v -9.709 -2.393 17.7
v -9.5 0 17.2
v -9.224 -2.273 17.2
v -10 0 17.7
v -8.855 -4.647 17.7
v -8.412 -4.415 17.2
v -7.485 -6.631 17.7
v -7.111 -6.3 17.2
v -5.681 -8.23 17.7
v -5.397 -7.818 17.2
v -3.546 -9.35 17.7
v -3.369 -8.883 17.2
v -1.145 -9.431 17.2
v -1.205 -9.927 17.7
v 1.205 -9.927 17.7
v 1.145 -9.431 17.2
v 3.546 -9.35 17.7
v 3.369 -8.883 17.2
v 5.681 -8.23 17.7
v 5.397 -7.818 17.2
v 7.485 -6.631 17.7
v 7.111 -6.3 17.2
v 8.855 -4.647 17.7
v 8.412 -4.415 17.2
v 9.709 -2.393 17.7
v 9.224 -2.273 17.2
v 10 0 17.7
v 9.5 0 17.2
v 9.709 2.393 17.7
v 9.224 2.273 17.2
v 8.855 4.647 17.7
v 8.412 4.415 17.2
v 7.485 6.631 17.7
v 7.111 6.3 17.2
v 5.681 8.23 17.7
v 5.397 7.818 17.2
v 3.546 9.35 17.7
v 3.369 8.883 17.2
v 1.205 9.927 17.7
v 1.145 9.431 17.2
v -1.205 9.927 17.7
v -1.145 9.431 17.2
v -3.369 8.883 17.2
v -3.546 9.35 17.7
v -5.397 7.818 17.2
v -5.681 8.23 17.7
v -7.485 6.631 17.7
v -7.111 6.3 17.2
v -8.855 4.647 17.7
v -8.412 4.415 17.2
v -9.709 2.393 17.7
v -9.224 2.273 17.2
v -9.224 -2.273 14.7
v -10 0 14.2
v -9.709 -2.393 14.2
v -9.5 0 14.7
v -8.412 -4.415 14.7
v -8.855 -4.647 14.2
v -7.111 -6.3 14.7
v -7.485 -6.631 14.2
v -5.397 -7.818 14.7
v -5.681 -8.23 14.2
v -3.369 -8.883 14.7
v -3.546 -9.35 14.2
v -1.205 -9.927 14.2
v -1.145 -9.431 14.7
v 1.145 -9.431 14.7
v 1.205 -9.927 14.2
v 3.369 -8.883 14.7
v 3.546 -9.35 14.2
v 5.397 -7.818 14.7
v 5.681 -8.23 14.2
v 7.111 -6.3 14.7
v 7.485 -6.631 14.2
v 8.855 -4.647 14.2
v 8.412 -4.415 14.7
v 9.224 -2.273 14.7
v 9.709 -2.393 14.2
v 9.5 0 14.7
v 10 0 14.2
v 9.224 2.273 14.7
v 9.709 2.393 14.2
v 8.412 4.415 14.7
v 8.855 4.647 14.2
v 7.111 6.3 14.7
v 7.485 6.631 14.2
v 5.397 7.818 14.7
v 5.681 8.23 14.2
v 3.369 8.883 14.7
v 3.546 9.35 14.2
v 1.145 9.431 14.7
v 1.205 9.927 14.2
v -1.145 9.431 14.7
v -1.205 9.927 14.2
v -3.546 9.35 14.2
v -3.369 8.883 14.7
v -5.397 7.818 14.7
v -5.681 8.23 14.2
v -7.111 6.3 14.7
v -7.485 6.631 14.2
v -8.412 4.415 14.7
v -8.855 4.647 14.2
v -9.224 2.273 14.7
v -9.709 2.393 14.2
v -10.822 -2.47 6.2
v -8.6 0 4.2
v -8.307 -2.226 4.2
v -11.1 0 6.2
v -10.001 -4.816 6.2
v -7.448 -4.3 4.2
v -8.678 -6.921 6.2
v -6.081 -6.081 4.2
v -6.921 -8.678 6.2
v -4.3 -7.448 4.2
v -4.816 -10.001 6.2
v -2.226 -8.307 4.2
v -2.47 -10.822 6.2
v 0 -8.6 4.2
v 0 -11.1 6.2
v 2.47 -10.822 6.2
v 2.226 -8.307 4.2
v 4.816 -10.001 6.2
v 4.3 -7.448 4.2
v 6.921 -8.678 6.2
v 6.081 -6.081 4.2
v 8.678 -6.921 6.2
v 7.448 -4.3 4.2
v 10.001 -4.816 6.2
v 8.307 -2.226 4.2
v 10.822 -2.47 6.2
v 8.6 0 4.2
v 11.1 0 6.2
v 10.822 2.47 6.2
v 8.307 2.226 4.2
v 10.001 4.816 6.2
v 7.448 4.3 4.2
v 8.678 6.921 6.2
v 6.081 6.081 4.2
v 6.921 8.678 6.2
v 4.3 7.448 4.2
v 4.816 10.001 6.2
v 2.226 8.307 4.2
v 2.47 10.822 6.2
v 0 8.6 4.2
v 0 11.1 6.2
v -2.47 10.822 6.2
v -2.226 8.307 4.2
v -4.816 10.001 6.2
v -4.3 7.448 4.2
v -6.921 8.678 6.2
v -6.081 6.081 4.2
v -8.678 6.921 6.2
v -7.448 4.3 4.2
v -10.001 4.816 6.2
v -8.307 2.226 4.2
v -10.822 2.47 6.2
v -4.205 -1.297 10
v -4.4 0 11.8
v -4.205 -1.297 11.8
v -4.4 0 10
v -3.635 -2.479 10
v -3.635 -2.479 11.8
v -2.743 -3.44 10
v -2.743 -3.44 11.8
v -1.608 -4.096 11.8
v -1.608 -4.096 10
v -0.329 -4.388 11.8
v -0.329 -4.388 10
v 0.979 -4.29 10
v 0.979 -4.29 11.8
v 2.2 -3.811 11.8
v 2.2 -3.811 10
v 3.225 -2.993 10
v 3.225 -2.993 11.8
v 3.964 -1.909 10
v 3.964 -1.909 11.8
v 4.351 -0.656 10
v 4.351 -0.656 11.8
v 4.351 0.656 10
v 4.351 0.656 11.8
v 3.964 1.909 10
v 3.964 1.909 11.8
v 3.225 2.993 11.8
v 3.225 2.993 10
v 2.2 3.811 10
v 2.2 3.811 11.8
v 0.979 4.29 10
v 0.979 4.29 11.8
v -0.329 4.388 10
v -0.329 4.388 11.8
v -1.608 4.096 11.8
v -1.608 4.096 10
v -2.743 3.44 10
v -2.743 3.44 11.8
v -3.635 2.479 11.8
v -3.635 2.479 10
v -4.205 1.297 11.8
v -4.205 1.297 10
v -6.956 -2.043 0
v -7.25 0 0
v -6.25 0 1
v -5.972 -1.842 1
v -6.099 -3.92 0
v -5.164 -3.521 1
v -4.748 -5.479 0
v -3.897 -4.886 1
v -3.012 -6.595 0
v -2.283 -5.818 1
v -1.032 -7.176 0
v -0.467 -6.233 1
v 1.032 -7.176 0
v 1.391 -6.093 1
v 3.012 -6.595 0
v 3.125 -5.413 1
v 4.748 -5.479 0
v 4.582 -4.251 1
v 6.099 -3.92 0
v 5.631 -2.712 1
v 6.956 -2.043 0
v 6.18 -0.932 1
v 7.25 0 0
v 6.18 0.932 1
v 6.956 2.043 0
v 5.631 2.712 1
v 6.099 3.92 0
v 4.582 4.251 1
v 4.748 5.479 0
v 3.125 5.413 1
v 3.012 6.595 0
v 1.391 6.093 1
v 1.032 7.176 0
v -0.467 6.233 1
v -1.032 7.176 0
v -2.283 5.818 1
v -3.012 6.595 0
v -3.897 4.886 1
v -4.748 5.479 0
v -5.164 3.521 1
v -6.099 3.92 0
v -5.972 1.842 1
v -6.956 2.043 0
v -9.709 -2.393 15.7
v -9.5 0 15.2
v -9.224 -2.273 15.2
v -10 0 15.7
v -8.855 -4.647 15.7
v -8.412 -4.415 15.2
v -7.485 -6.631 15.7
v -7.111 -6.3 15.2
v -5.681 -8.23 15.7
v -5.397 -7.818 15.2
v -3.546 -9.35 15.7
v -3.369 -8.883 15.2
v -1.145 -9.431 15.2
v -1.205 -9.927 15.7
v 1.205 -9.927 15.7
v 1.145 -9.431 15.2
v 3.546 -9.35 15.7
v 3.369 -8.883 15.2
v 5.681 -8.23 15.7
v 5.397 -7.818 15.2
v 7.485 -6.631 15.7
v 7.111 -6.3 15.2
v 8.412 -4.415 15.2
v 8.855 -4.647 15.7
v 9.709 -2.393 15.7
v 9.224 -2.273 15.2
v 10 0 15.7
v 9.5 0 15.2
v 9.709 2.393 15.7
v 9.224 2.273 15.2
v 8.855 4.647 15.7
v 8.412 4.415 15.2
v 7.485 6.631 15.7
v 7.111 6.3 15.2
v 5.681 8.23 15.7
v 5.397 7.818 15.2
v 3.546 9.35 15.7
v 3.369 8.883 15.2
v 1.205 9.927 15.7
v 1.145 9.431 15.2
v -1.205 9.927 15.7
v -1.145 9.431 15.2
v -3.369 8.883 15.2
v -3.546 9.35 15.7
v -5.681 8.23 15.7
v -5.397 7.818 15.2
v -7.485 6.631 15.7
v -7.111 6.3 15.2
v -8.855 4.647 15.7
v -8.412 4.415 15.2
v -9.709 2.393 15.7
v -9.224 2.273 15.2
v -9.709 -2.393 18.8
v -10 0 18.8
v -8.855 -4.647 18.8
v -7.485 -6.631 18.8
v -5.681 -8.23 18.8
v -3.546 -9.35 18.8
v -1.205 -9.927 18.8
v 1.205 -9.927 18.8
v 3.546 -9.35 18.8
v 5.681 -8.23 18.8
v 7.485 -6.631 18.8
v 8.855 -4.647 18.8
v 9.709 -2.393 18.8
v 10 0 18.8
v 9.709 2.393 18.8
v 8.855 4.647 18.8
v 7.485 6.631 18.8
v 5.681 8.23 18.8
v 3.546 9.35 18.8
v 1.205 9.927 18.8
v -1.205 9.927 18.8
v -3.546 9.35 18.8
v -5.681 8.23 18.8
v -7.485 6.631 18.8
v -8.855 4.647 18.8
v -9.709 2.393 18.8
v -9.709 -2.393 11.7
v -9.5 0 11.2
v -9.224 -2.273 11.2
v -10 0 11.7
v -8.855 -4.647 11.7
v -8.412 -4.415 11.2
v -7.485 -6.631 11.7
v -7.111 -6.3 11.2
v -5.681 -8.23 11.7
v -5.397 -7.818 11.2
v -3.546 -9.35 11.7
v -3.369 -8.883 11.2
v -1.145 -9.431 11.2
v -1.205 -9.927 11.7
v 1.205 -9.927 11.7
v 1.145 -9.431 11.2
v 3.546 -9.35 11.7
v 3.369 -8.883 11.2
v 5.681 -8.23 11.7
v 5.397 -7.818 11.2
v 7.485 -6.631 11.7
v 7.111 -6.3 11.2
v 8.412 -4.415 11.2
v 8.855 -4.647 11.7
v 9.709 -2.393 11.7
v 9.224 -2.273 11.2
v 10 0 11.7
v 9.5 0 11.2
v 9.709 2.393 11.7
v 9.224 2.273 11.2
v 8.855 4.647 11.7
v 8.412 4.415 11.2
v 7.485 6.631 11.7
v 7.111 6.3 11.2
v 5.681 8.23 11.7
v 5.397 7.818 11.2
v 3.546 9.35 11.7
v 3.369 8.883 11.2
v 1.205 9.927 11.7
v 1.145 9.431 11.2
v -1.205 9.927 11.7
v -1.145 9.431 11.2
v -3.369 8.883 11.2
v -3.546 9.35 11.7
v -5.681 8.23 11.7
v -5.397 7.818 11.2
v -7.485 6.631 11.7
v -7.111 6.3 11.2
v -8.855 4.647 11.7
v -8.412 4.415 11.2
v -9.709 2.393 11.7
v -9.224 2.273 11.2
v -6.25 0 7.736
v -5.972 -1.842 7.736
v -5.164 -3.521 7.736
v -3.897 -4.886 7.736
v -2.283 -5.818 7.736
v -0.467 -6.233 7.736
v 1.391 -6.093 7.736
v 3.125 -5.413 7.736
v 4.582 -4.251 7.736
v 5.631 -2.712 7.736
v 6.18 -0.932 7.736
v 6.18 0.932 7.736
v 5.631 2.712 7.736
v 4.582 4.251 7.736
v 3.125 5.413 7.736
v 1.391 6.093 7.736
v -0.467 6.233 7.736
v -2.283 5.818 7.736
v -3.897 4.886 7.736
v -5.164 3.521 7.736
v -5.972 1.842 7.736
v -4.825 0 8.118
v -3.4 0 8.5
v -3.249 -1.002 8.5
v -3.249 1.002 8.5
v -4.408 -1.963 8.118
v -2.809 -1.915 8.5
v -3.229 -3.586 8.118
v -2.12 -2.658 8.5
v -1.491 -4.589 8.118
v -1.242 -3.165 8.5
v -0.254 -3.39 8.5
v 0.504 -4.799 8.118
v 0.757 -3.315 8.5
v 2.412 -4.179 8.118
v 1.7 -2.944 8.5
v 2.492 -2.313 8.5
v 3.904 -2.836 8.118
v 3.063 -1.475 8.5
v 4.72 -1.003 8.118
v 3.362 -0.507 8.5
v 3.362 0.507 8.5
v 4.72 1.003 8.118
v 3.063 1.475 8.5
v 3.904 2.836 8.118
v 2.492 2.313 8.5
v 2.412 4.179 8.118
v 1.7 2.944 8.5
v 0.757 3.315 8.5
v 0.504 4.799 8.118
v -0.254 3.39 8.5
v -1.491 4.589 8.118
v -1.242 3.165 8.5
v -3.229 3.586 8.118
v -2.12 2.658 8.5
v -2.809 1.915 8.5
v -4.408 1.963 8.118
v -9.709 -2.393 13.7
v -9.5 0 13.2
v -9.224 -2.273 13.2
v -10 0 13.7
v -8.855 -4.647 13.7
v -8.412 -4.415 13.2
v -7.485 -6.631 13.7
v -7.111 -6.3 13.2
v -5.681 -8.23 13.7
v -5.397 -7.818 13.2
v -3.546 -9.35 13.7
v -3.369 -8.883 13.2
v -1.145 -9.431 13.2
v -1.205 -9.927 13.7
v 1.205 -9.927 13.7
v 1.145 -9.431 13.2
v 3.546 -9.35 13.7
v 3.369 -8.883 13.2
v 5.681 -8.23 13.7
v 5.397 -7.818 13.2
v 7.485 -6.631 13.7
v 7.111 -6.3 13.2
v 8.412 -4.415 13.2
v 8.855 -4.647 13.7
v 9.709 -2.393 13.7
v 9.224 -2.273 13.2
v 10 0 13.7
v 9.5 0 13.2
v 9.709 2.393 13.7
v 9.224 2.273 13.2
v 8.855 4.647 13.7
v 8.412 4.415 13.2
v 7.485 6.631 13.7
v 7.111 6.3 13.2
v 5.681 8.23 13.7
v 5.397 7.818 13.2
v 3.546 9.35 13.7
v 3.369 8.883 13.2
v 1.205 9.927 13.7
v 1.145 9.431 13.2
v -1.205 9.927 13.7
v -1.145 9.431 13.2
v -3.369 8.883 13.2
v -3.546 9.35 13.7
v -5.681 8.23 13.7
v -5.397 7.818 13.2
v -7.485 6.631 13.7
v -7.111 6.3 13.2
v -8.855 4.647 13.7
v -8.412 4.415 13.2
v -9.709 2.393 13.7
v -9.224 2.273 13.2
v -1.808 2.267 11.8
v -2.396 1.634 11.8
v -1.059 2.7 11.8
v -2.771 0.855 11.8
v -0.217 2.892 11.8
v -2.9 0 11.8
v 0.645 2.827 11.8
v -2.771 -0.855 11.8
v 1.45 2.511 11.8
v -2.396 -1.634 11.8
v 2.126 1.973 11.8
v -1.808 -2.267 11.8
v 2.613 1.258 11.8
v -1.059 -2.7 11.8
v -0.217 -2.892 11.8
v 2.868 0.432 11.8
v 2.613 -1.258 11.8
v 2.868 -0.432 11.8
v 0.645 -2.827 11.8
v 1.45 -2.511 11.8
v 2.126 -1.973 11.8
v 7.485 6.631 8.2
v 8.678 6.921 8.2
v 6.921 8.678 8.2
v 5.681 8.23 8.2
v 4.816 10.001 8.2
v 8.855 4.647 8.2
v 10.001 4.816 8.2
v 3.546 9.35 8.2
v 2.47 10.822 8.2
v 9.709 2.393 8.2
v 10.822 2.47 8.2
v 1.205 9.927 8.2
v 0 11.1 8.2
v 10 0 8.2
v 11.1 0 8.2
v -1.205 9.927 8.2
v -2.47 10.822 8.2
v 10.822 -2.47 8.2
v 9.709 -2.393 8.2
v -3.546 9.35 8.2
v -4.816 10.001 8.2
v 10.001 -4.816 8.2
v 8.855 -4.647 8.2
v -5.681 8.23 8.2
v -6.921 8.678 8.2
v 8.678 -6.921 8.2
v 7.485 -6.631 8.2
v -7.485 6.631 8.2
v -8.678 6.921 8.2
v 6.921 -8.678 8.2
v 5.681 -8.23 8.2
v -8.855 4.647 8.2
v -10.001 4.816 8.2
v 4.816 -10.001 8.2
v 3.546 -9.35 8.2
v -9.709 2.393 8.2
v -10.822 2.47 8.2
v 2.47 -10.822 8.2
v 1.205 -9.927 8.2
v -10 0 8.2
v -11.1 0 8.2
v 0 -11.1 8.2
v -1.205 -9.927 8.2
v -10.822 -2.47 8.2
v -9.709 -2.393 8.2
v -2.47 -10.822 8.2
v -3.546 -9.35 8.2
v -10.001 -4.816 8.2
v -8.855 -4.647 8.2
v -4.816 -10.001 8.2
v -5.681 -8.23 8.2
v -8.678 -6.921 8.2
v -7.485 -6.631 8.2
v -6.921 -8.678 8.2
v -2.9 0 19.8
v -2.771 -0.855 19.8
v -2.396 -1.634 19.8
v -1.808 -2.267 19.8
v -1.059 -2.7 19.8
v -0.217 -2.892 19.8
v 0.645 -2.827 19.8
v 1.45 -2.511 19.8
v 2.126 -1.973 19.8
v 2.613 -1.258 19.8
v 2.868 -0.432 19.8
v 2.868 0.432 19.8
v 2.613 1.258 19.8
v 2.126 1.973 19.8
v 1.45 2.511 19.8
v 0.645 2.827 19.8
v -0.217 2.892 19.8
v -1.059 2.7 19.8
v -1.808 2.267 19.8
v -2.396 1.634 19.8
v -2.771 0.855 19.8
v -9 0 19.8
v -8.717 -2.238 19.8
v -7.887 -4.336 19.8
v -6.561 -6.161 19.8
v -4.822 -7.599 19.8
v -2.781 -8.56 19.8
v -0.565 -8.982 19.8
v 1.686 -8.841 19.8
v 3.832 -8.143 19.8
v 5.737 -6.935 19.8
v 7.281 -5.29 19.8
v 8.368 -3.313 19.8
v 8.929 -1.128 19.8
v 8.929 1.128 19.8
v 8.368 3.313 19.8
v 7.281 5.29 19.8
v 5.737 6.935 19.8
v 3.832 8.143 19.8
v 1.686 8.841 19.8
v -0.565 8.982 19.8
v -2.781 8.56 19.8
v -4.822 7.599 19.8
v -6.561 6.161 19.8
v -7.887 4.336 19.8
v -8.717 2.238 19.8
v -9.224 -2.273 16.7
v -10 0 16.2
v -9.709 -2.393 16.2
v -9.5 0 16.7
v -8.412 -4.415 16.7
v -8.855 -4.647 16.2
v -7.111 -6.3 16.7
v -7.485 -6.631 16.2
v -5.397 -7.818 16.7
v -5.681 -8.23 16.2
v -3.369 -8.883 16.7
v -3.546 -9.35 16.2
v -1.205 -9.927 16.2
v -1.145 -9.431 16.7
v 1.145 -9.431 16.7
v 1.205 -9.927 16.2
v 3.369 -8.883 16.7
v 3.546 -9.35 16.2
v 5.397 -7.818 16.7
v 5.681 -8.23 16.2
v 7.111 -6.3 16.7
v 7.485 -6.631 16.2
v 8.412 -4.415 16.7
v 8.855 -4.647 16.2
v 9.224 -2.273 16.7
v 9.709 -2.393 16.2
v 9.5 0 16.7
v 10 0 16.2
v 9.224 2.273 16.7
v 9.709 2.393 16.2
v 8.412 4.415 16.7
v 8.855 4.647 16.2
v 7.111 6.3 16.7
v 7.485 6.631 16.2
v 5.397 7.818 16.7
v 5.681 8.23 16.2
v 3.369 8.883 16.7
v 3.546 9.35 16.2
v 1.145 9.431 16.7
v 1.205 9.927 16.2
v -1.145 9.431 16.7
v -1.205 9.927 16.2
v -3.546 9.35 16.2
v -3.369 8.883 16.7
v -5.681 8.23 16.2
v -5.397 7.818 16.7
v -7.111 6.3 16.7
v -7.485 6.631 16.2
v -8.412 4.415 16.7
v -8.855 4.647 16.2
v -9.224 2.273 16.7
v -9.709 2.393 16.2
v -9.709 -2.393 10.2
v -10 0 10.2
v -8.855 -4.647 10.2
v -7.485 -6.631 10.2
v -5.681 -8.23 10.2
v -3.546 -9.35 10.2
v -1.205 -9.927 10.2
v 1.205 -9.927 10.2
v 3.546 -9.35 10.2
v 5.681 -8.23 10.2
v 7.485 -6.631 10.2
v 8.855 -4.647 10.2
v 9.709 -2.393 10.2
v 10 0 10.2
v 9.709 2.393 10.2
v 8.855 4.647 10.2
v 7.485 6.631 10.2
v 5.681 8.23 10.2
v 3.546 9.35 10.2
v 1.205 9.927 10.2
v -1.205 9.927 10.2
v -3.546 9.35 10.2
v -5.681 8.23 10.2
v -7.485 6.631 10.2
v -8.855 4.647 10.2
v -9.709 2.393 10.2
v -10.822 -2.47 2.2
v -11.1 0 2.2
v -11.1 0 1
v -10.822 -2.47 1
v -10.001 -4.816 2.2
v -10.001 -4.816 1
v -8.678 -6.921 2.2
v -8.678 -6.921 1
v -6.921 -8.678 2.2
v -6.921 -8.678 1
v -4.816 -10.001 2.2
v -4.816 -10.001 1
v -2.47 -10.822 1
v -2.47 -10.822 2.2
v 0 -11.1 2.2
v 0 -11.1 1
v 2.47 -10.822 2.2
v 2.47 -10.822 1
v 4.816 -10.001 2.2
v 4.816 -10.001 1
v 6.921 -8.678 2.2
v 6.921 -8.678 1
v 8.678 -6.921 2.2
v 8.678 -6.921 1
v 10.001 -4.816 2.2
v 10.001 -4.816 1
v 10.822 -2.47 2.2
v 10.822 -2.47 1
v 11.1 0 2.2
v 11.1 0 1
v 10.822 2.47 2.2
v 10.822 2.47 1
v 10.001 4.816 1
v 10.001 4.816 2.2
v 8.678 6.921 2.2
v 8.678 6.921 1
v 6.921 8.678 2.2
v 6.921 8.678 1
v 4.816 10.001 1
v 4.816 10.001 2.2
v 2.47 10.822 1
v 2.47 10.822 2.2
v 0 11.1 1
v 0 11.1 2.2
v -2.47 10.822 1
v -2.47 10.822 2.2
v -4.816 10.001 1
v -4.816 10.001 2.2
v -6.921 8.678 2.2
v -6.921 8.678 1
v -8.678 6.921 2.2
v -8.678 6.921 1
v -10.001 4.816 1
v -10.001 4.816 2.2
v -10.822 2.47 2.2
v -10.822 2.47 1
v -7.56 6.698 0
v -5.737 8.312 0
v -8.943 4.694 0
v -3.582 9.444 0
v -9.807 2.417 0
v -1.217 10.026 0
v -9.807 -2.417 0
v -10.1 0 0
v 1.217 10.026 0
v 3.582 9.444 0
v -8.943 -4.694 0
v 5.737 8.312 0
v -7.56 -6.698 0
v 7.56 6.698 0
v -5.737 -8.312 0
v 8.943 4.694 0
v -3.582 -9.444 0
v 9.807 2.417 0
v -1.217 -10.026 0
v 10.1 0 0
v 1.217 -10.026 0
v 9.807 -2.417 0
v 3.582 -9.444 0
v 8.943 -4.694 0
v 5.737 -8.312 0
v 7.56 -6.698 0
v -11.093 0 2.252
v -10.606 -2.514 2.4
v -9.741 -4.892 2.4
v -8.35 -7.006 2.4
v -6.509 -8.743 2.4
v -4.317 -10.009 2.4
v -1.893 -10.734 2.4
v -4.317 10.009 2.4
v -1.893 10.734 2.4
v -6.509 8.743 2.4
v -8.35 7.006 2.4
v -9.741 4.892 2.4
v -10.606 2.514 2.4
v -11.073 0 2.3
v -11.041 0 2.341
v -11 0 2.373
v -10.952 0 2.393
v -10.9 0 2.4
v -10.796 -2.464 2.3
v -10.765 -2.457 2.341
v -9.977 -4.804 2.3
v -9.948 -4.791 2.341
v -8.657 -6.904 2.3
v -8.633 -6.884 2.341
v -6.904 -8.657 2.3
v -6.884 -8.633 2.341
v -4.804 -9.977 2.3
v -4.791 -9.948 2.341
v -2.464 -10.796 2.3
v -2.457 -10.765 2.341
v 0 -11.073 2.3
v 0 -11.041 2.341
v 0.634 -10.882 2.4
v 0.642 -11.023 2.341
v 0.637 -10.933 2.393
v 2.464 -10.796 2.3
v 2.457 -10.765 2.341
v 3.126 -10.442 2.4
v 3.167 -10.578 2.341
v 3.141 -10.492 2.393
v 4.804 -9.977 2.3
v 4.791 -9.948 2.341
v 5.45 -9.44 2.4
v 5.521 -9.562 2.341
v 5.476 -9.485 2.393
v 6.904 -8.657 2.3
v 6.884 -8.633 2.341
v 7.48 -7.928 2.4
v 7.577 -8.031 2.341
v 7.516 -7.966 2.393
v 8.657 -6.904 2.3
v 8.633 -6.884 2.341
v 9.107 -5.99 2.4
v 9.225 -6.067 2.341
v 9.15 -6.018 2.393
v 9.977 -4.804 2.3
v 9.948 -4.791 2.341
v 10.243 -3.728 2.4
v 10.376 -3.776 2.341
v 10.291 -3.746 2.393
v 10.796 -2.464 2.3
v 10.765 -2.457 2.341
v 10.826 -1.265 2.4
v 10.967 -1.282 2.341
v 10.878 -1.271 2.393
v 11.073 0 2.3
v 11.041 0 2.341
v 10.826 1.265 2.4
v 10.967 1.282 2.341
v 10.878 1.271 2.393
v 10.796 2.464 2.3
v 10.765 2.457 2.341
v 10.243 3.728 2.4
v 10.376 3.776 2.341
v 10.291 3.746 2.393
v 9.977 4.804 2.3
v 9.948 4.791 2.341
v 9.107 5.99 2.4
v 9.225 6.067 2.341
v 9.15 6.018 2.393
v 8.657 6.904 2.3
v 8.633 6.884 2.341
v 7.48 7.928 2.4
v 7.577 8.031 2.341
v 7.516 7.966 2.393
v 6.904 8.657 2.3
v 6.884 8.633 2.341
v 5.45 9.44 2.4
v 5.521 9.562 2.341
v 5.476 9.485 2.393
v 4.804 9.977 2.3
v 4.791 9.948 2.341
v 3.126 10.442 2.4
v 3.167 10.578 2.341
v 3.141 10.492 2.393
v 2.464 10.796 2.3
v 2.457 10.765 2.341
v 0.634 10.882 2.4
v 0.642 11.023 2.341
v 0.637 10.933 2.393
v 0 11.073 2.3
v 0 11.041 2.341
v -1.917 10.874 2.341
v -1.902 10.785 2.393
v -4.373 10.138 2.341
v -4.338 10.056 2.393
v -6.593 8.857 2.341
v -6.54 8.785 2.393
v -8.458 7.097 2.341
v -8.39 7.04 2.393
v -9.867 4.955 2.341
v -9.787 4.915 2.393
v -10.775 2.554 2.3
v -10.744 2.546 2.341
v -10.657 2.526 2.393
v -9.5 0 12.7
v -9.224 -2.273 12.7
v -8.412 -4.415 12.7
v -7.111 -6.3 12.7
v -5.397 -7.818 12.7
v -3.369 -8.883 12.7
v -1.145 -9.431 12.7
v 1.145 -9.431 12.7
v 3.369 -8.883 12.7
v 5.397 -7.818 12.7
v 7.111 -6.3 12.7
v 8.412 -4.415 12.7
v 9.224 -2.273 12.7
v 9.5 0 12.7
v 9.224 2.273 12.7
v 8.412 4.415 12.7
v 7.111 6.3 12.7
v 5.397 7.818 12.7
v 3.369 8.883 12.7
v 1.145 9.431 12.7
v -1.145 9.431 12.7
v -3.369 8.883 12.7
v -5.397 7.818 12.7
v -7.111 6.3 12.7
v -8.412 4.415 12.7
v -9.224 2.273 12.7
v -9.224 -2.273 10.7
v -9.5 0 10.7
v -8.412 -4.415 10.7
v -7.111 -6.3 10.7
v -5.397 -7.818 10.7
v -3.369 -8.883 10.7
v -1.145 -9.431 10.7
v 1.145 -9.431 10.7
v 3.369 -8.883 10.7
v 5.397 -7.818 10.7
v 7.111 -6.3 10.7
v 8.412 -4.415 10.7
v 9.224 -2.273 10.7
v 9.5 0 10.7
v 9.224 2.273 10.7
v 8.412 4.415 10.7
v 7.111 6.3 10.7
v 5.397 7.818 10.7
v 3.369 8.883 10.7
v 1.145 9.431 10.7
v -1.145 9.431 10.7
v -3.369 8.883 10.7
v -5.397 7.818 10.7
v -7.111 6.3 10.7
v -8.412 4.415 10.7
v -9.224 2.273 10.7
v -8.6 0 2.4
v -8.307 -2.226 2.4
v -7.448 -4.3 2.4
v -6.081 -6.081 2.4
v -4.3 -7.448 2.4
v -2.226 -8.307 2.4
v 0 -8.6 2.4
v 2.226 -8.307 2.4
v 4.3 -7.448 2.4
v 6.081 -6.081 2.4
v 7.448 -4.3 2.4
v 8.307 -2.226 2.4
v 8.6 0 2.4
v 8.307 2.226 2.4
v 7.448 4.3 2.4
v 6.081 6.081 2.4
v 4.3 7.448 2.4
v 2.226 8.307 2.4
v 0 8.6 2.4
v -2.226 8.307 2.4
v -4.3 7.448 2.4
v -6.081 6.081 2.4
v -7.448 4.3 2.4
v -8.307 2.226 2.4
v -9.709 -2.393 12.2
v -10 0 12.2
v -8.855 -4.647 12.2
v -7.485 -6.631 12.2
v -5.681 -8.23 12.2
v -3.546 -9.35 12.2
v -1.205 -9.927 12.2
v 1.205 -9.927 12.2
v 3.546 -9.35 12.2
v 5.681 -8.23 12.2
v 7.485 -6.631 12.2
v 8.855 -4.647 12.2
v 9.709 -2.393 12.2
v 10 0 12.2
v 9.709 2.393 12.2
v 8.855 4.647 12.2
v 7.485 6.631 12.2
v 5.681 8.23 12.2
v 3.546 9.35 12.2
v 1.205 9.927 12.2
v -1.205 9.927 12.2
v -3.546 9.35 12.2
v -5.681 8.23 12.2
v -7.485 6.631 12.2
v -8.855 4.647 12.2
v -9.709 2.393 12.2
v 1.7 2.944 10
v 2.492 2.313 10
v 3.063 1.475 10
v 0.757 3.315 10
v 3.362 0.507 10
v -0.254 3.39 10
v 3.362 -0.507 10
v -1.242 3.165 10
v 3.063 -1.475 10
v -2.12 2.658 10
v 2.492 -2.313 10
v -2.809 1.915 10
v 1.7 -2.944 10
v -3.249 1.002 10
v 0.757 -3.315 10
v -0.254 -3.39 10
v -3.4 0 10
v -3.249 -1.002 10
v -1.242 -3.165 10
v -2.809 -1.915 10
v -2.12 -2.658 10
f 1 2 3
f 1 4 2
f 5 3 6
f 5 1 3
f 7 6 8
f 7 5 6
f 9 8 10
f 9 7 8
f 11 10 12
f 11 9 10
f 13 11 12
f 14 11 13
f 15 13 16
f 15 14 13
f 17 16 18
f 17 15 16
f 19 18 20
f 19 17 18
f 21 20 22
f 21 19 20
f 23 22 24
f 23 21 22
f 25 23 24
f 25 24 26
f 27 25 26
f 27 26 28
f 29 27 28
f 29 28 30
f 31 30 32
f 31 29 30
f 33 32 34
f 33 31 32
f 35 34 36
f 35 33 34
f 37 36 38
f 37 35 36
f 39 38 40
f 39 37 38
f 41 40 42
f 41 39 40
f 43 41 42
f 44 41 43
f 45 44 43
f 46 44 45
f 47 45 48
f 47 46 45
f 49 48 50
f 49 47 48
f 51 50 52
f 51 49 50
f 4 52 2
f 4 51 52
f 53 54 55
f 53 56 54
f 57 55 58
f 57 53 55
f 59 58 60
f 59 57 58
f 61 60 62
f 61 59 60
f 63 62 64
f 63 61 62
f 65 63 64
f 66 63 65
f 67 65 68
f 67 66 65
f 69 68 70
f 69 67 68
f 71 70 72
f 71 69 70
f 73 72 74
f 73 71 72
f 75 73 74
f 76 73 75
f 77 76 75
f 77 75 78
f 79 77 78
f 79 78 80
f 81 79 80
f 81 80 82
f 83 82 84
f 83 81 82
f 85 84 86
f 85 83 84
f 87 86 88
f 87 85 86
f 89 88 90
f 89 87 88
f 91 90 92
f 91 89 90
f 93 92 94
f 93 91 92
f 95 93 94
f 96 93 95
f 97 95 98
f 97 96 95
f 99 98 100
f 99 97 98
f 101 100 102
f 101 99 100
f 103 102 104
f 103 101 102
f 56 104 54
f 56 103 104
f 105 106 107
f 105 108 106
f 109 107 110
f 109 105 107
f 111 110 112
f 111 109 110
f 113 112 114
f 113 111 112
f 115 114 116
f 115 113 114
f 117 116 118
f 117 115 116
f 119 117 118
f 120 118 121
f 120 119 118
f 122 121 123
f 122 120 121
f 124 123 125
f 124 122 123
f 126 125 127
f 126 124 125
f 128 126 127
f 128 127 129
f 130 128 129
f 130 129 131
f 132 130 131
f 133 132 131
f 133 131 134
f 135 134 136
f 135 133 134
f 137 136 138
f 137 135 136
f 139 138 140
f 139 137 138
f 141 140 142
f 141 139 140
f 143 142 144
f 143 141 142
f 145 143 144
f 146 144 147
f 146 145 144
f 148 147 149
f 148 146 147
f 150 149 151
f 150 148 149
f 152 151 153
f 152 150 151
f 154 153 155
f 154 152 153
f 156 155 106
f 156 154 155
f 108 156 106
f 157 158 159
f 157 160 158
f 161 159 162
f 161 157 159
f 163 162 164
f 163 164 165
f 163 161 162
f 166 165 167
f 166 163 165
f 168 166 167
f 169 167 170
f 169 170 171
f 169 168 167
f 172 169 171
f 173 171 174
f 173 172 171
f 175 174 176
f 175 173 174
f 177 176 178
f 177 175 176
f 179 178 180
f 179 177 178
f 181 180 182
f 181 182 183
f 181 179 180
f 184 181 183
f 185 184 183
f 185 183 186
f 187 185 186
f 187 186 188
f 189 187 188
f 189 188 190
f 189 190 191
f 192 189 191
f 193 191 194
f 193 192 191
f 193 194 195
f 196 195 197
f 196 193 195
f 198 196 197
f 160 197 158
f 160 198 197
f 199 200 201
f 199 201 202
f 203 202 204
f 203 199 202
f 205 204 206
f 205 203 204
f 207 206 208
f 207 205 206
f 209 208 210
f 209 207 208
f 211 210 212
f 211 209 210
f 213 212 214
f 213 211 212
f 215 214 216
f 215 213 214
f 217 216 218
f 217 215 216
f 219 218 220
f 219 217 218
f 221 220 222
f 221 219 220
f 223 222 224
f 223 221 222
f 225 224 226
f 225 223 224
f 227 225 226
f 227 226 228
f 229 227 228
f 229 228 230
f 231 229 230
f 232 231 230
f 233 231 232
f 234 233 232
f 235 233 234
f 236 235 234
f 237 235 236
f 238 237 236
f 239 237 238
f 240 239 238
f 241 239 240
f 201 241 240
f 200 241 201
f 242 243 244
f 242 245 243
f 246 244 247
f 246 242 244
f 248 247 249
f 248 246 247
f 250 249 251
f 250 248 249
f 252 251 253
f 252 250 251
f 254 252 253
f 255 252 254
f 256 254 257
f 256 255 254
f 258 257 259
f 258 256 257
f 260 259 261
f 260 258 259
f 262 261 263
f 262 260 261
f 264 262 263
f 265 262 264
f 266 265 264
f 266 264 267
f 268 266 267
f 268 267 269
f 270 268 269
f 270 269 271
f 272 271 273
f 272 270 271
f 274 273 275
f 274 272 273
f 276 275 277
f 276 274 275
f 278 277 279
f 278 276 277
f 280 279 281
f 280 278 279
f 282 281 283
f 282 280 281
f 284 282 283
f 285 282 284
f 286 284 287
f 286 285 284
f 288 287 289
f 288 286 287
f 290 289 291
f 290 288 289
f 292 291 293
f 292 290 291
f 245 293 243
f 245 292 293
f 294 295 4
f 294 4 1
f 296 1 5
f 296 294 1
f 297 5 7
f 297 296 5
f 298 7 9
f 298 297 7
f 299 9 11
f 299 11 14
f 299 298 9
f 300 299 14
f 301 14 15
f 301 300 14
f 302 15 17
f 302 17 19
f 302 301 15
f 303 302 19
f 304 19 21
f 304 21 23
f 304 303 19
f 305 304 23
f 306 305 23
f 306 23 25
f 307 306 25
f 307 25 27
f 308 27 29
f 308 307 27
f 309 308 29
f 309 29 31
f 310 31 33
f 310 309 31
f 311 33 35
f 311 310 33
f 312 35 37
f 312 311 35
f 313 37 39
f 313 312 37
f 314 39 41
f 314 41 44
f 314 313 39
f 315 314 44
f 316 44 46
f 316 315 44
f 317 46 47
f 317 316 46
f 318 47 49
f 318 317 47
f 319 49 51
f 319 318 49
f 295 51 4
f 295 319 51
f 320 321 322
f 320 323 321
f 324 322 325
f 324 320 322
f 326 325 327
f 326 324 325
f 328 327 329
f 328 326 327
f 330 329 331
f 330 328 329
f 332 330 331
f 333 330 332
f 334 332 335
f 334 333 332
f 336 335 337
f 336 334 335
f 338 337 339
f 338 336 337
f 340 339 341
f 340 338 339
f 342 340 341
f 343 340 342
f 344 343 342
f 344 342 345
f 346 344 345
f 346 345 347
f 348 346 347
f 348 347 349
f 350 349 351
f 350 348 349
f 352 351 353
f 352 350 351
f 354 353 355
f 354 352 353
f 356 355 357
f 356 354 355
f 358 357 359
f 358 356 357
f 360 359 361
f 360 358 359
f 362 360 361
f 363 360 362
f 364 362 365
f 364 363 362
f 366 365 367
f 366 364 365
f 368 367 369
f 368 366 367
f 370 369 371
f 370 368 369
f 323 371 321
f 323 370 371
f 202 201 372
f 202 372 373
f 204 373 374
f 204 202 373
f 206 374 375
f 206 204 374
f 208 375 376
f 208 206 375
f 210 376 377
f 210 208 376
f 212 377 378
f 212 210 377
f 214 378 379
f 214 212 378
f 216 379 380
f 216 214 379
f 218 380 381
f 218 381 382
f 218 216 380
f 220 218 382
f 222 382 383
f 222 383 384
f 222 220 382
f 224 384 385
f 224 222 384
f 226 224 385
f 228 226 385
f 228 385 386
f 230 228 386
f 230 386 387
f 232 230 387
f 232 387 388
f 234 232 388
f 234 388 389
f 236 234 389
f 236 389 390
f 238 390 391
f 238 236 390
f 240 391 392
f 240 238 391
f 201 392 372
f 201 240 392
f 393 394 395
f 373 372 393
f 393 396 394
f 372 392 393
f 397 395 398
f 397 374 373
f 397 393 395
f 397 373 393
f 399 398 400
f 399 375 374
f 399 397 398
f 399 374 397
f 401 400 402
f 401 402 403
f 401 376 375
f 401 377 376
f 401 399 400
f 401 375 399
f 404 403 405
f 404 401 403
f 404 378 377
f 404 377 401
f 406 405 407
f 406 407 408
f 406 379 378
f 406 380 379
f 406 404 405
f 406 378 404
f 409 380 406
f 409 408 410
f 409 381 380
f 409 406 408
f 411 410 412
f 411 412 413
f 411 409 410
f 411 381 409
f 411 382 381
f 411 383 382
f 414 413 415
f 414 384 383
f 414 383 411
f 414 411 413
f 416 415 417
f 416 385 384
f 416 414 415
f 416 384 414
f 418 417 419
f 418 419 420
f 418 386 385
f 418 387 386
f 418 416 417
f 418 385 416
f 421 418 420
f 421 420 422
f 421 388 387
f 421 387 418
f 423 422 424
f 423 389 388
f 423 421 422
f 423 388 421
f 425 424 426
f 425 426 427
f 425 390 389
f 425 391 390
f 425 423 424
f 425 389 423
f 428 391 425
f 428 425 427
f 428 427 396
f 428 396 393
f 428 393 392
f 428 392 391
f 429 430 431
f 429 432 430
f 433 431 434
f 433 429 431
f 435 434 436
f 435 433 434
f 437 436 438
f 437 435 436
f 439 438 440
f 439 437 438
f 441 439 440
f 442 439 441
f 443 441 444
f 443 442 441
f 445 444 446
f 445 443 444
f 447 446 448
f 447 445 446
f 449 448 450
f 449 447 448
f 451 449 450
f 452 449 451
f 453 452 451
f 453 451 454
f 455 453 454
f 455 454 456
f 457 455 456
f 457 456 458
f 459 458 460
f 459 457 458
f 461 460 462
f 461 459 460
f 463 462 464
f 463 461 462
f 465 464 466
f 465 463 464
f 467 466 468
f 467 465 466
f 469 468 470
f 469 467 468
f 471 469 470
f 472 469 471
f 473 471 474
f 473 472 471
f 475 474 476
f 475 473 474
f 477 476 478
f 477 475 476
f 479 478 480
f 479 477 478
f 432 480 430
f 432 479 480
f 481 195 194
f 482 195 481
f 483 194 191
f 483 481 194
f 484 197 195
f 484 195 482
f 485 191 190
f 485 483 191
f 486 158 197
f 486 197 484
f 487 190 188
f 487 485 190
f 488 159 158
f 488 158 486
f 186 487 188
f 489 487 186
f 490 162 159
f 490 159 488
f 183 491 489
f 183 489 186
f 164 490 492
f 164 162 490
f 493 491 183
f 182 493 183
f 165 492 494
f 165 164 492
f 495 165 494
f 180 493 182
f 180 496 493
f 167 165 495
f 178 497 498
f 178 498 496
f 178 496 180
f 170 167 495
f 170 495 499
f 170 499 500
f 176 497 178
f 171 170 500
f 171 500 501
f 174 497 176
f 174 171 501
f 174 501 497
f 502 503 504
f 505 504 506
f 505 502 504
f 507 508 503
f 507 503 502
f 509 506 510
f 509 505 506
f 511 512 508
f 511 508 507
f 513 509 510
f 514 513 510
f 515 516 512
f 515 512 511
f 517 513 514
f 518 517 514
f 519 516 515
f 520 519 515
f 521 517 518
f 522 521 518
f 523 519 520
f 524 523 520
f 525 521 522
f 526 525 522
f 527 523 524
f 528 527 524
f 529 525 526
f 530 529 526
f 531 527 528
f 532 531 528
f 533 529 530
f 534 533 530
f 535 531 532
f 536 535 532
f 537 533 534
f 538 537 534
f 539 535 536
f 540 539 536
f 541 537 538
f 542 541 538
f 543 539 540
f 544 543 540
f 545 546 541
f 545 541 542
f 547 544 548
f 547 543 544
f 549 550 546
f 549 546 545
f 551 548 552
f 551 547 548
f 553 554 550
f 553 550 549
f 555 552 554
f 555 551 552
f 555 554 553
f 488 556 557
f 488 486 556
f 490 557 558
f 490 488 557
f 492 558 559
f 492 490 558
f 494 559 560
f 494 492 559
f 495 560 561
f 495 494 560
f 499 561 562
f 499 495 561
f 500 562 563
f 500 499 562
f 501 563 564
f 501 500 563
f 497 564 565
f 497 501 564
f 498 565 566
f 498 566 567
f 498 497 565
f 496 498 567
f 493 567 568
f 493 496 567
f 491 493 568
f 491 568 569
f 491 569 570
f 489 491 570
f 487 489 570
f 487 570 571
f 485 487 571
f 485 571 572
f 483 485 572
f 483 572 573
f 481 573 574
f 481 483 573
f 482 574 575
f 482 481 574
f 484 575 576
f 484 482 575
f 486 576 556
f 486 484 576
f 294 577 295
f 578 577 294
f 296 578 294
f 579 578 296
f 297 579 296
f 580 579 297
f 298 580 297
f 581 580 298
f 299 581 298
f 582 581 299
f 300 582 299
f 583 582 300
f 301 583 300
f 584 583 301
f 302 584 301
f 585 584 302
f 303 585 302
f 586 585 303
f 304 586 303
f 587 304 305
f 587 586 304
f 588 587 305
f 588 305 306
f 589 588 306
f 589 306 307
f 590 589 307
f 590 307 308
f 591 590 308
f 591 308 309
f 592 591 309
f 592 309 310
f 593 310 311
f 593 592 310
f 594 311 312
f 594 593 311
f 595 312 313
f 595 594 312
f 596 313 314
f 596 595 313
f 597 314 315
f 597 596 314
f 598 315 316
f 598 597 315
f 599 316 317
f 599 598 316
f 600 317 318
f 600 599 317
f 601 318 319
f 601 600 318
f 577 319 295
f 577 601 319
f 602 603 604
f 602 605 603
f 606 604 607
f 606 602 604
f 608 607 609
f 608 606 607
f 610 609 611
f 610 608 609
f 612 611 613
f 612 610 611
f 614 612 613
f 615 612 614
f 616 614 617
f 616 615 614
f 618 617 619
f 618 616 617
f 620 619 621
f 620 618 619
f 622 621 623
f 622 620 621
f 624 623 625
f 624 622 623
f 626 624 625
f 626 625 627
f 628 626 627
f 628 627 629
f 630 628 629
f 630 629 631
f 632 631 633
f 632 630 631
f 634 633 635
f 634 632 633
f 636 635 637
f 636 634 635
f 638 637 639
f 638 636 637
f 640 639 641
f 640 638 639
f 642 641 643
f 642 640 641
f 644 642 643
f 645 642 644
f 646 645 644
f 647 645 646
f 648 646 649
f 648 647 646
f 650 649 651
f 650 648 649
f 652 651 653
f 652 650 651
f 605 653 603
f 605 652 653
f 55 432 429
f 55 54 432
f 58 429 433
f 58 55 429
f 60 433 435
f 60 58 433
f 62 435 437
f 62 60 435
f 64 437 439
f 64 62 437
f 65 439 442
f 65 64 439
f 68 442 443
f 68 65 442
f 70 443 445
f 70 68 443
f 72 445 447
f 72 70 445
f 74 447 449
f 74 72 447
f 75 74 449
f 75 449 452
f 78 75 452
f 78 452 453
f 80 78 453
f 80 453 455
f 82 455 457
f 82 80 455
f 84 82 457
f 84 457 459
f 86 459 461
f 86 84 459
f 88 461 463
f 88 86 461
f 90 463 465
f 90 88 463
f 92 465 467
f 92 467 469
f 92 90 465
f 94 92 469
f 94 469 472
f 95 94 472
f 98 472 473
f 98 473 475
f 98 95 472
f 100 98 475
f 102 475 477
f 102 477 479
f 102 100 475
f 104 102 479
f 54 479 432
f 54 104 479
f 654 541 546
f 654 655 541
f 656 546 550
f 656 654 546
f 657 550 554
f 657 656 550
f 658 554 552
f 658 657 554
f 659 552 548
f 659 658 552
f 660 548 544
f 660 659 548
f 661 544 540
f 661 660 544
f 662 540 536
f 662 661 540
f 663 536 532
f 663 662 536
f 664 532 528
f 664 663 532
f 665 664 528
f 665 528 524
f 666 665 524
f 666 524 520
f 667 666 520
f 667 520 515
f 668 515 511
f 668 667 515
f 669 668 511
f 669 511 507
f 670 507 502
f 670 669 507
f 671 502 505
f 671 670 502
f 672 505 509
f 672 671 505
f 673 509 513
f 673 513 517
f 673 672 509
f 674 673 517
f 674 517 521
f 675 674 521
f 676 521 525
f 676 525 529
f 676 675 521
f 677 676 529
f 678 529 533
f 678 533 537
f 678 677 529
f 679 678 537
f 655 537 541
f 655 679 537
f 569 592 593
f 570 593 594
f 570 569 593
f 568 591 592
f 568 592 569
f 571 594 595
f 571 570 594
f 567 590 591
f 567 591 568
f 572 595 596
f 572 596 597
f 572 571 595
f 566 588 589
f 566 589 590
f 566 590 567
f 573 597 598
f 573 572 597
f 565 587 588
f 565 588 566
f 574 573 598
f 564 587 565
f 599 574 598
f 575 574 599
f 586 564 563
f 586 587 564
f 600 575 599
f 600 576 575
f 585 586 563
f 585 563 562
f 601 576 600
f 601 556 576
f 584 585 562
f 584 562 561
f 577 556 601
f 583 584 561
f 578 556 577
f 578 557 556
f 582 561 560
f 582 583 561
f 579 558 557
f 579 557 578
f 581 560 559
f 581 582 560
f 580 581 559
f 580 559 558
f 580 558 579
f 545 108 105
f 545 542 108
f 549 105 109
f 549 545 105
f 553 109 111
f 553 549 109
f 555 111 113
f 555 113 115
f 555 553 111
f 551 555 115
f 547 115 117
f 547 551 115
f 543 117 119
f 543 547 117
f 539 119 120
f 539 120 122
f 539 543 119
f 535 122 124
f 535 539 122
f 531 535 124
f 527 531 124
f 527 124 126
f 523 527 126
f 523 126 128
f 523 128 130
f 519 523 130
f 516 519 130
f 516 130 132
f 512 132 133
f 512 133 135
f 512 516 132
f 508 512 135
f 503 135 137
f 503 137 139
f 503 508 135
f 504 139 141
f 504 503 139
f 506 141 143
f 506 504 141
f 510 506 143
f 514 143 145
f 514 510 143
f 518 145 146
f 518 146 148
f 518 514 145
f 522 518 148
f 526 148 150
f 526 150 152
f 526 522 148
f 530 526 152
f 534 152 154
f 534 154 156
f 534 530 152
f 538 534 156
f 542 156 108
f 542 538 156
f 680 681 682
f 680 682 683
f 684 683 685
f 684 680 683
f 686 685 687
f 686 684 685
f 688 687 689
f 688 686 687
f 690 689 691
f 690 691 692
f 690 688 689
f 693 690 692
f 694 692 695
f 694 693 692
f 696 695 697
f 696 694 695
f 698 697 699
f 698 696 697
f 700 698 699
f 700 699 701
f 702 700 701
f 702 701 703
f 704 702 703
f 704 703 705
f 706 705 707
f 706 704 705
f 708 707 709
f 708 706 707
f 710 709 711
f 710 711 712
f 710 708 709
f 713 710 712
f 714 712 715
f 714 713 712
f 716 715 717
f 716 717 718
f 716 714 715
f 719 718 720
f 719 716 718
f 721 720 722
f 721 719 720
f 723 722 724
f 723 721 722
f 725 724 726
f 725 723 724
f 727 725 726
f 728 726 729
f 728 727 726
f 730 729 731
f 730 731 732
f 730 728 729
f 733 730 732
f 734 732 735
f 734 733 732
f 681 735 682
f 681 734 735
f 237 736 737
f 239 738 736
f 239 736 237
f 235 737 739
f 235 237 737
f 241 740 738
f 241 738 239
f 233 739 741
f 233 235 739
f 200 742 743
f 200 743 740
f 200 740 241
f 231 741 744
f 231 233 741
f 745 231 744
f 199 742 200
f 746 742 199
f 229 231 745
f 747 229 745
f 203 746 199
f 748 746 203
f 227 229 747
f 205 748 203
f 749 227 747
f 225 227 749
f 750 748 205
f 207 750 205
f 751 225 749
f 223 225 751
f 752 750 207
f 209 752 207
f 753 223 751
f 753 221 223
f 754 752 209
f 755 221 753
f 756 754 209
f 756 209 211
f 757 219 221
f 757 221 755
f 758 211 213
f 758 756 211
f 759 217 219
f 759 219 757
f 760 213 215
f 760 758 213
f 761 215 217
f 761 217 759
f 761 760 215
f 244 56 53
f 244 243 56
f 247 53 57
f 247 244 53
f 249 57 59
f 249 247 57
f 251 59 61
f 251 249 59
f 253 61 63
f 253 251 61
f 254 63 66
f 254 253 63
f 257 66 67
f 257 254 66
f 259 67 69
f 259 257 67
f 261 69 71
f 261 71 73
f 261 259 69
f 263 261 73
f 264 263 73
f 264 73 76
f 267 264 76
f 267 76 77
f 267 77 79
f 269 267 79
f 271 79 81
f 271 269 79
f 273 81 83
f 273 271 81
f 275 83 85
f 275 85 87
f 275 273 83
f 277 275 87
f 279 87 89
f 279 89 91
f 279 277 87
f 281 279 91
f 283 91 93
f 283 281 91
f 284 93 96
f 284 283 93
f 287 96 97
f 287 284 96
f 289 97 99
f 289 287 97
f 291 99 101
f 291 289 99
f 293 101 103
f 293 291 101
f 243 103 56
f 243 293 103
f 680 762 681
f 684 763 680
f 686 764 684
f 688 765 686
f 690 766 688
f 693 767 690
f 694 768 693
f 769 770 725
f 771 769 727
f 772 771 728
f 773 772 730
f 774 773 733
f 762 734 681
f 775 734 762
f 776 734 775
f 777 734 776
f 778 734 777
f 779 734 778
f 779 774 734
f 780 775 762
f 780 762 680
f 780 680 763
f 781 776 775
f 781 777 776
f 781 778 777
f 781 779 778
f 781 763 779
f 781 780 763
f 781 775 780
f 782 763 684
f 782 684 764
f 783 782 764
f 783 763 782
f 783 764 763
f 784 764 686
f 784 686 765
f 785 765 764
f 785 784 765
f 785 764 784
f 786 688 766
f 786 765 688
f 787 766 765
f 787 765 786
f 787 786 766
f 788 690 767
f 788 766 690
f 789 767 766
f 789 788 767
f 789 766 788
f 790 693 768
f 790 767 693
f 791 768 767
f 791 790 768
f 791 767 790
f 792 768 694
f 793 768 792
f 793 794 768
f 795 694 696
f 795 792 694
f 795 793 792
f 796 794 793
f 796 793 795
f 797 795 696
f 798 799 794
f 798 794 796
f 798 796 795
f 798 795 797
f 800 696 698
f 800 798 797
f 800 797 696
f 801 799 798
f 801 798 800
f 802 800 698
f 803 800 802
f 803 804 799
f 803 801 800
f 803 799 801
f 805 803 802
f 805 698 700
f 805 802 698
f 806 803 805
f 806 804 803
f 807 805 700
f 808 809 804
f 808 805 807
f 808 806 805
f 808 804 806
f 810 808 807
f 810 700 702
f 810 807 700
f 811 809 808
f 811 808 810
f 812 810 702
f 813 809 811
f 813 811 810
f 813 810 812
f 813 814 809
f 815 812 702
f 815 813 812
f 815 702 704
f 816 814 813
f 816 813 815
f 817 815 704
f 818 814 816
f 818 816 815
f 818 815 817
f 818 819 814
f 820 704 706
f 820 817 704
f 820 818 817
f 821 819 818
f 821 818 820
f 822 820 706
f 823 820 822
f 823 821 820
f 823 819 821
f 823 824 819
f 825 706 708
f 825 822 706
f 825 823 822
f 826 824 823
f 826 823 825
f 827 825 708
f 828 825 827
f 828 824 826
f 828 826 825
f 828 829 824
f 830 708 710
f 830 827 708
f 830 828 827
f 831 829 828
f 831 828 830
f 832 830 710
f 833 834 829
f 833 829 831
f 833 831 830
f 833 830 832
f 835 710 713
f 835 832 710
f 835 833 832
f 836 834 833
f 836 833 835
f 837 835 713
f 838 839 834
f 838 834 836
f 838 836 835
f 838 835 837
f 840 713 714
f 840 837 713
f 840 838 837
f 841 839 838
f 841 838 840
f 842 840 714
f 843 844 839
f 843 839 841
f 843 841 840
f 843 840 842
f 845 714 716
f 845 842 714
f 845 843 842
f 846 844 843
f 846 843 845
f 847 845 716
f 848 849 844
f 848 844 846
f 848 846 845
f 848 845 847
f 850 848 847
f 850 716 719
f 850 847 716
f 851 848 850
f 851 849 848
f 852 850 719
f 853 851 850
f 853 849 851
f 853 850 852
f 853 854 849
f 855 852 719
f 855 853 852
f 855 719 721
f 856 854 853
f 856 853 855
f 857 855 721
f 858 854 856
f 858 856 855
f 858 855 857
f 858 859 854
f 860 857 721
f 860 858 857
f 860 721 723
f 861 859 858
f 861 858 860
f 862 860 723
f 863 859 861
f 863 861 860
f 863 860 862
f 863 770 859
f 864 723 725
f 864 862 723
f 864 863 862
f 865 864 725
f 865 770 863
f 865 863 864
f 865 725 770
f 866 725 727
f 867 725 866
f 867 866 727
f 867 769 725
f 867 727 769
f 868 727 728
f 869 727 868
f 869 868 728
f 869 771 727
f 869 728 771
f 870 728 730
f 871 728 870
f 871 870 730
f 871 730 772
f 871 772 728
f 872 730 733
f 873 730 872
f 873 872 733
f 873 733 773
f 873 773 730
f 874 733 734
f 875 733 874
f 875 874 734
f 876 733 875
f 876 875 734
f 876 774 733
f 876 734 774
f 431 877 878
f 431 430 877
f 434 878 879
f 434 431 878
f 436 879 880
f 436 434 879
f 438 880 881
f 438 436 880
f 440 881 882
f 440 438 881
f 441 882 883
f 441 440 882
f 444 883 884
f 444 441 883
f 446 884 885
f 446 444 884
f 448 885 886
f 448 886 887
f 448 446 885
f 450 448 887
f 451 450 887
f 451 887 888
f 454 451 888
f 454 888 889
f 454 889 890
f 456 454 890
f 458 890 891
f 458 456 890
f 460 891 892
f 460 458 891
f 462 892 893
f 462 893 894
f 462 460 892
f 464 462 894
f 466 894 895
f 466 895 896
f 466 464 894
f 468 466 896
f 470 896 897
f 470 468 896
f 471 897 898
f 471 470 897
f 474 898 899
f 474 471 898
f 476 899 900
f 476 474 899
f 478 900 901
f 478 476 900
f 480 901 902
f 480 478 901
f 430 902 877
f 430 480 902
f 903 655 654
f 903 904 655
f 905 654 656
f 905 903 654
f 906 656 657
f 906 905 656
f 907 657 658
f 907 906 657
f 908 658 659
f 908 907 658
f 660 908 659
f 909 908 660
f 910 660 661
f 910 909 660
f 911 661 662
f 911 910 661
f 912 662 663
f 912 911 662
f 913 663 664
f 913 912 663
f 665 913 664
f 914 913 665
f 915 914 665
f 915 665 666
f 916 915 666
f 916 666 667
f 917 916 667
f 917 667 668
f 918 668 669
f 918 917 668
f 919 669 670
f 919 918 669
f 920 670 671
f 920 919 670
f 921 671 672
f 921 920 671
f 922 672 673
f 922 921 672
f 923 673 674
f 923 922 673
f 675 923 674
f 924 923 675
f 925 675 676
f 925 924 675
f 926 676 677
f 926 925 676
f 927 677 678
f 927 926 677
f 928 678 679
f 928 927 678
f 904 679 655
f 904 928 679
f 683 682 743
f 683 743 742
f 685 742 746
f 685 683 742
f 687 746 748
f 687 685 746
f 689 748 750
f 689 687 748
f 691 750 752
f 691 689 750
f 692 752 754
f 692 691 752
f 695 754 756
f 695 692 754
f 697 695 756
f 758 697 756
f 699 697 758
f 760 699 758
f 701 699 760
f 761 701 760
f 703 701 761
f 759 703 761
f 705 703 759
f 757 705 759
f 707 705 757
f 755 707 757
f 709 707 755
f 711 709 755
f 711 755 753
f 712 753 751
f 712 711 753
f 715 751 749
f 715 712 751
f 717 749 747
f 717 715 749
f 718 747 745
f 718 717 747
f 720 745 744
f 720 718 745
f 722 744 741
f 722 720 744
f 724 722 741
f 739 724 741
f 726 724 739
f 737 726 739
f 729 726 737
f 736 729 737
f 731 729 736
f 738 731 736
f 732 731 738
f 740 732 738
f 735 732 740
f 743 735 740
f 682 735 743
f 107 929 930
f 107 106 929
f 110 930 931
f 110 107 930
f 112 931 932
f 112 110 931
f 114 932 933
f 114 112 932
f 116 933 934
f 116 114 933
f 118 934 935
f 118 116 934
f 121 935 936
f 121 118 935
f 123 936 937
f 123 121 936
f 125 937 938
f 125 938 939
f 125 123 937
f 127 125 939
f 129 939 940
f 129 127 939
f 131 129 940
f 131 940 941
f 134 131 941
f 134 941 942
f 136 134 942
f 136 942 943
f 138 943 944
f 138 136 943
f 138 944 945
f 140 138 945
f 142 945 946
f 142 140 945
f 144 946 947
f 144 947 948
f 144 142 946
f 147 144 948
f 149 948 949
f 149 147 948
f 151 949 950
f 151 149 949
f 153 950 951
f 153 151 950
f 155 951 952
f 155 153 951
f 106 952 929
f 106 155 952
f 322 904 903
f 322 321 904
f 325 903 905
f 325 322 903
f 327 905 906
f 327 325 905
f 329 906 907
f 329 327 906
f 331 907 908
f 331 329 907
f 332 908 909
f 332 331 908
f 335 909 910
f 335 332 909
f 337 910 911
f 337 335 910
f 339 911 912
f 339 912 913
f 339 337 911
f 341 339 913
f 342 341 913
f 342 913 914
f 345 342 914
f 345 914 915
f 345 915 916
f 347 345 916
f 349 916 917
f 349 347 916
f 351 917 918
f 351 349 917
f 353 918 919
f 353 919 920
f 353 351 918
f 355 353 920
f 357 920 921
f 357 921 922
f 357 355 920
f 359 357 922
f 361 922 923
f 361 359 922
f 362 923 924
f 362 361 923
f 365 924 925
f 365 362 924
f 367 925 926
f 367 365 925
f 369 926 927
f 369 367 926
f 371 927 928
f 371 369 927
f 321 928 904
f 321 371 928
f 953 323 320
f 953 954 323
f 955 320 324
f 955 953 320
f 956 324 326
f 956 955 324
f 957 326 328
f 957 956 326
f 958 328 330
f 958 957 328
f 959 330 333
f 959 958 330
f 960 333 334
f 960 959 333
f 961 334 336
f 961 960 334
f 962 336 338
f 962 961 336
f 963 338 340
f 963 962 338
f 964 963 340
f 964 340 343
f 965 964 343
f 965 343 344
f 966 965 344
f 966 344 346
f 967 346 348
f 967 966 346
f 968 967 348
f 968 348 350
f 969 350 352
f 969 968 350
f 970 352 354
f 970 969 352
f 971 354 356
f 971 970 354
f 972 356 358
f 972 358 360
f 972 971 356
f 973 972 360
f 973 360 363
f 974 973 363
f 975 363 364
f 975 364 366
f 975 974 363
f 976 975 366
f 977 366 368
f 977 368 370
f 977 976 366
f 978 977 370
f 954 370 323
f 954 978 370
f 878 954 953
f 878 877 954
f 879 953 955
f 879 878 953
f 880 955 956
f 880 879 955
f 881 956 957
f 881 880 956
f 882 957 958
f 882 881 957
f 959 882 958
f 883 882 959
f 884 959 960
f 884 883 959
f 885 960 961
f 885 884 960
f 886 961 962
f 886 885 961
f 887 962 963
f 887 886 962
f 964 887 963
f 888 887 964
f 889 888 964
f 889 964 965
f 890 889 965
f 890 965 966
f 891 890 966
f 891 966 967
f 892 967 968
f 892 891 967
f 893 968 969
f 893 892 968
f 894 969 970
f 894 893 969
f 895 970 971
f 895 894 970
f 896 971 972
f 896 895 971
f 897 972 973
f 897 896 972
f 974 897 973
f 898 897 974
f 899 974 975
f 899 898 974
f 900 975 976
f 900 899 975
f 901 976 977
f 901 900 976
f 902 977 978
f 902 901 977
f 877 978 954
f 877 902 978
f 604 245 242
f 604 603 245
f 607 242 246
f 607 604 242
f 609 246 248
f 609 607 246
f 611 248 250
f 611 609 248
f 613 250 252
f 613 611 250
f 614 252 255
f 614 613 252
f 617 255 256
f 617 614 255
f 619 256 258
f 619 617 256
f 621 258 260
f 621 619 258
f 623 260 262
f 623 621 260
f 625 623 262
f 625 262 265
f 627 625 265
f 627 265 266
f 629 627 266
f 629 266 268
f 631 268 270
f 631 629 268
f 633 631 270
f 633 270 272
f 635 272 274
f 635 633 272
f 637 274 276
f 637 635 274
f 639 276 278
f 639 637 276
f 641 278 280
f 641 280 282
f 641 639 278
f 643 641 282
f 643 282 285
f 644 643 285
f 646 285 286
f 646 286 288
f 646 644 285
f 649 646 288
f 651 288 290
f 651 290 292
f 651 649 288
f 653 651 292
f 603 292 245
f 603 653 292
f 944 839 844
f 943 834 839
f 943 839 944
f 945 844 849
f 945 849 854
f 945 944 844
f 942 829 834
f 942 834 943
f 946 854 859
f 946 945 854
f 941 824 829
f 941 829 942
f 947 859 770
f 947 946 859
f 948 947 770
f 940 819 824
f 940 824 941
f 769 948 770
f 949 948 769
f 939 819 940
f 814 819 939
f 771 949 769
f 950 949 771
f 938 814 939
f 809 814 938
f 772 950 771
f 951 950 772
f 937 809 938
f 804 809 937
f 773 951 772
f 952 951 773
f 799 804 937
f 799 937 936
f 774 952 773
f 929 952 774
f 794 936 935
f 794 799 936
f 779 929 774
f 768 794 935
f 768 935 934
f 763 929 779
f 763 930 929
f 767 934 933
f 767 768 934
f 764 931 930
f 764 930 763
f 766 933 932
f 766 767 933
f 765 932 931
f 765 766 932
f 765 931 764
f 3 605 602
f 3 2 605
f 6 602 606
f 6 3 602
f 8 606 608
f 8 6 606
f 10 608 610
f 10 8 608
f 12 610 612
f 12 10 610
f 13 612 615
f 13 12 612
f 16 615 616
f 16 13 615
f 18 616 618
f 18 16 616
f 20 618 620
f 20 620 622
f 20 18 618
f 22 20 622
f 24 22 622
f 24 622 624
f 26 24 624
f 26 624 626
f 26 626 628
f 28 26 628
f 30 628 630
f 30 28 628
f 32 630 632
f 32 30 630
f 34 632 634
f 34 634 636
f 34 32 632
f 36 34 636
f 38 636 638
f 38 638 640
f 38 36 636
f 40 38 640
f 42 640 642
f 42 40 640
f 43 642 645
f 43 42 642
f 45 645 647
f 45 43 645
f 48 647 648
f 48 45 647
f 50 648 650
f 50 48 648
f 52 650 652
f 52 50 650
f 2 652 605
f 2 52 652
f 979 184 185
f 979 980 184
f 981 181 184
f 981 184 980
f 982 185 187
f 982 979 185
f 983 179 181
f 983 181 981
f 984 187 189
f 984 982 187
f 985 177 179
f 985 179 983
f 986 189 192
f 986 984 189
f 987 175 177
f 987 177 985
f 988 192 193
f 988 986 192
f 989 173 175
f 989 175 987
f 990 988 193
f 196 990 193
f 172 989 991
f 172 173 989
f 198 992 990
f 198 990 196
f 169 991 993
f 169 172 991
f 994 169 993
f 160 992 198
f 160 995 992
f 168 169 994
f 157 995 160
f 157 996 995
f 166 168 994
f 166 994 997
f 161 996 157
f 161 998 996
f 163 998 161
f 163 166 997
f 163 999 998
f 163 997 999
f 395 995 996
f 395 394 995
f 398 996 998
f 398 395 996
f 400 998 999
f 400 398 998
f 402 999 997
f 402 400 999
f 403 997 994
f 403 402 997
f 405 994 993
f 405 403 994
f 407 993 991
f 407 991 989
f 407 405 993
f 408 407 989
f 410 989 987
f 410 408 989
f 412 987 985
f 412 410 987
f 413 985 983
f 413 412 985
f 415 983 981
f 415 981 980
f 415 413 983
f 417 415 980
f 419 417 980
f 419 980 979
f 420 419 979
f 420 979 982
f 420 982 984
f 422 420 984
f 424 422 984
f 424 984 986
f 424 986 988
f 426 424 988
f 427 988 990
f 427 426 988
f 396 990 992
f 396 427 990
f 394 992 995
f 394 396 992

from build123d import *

# Parameters (mm, degrees)
CHAMFER_1_SIZE = 1
CHAMFER_2_SIZE = 1
FILLET_1_R     = 0.2


with BuildPart() as part:
    # 스케치3 → 회전2 (revolve)
    with BuildSketch(Plane(origin=(0, 0, 0), x_dir=(1, 0, 0), z_dir=(0, 1, 0)), mode=Mode.PRIVATE) as revolve_2_sk:
        Polygon((11.1, 0), (11.1, -2.4), (8.6, -2.4), (8.6, -4.2), (11.1, -6.2), (11.1, -8.2), (10, -8.2), (10, -10.2), (9.5, -10.7), (9.5, -11.2), (10, -11.7), (10, -12.2), (9.5, -12.7), (9.5, -13.2), (10, -13.7), (10, -14.2), (9.5, -14.7), (9.5, -15.2), (10, -15.7), (10, -16.2), (9.5, -16.7), (9.5, -17.2), (10, -17.7), (10, -19.8), (2.9, -19.8), (2.9, -11.8), (4.4, -11.8), (4.4, -10), (3.4, -10), (3.4, -8.5), (6.25, -7.736344802), (6.25, 0), align=None)
    revolve(revolve_2_sk.sketch.rotate(Axis((0, 0, 0), (0, 0, 1)), 180), axis=Axis((0, 0, 0), (0, 0, 1)))

    # 모따기1
    chamfer_1_edges = [part.edges().sort_by_distance(p)[0] for p in [
        (10, 0, 19.8),
        (6.25, 0, 0),
    ]]
    chamfer(chamfer_1_edges, length=CHAMFER_1_SIZE)

    # 모따기2
    chamfer_2_edges = [part.edges().sort_by_distance(p)[0] for p in [
        (11.1, 0, 0),
    ]]
    chamfer(chamfer_2_edges, length=CHAMFER_2_SIZE)

    # 필렛1
    fillet_1_edges = [part.edges().sort_by_distance(p)[0] for p in [
        (11.1, 0, 2.4),
    ]]
    fillet(fillet_1_edges, radius=FILLET_1_R)


solid = part.part
